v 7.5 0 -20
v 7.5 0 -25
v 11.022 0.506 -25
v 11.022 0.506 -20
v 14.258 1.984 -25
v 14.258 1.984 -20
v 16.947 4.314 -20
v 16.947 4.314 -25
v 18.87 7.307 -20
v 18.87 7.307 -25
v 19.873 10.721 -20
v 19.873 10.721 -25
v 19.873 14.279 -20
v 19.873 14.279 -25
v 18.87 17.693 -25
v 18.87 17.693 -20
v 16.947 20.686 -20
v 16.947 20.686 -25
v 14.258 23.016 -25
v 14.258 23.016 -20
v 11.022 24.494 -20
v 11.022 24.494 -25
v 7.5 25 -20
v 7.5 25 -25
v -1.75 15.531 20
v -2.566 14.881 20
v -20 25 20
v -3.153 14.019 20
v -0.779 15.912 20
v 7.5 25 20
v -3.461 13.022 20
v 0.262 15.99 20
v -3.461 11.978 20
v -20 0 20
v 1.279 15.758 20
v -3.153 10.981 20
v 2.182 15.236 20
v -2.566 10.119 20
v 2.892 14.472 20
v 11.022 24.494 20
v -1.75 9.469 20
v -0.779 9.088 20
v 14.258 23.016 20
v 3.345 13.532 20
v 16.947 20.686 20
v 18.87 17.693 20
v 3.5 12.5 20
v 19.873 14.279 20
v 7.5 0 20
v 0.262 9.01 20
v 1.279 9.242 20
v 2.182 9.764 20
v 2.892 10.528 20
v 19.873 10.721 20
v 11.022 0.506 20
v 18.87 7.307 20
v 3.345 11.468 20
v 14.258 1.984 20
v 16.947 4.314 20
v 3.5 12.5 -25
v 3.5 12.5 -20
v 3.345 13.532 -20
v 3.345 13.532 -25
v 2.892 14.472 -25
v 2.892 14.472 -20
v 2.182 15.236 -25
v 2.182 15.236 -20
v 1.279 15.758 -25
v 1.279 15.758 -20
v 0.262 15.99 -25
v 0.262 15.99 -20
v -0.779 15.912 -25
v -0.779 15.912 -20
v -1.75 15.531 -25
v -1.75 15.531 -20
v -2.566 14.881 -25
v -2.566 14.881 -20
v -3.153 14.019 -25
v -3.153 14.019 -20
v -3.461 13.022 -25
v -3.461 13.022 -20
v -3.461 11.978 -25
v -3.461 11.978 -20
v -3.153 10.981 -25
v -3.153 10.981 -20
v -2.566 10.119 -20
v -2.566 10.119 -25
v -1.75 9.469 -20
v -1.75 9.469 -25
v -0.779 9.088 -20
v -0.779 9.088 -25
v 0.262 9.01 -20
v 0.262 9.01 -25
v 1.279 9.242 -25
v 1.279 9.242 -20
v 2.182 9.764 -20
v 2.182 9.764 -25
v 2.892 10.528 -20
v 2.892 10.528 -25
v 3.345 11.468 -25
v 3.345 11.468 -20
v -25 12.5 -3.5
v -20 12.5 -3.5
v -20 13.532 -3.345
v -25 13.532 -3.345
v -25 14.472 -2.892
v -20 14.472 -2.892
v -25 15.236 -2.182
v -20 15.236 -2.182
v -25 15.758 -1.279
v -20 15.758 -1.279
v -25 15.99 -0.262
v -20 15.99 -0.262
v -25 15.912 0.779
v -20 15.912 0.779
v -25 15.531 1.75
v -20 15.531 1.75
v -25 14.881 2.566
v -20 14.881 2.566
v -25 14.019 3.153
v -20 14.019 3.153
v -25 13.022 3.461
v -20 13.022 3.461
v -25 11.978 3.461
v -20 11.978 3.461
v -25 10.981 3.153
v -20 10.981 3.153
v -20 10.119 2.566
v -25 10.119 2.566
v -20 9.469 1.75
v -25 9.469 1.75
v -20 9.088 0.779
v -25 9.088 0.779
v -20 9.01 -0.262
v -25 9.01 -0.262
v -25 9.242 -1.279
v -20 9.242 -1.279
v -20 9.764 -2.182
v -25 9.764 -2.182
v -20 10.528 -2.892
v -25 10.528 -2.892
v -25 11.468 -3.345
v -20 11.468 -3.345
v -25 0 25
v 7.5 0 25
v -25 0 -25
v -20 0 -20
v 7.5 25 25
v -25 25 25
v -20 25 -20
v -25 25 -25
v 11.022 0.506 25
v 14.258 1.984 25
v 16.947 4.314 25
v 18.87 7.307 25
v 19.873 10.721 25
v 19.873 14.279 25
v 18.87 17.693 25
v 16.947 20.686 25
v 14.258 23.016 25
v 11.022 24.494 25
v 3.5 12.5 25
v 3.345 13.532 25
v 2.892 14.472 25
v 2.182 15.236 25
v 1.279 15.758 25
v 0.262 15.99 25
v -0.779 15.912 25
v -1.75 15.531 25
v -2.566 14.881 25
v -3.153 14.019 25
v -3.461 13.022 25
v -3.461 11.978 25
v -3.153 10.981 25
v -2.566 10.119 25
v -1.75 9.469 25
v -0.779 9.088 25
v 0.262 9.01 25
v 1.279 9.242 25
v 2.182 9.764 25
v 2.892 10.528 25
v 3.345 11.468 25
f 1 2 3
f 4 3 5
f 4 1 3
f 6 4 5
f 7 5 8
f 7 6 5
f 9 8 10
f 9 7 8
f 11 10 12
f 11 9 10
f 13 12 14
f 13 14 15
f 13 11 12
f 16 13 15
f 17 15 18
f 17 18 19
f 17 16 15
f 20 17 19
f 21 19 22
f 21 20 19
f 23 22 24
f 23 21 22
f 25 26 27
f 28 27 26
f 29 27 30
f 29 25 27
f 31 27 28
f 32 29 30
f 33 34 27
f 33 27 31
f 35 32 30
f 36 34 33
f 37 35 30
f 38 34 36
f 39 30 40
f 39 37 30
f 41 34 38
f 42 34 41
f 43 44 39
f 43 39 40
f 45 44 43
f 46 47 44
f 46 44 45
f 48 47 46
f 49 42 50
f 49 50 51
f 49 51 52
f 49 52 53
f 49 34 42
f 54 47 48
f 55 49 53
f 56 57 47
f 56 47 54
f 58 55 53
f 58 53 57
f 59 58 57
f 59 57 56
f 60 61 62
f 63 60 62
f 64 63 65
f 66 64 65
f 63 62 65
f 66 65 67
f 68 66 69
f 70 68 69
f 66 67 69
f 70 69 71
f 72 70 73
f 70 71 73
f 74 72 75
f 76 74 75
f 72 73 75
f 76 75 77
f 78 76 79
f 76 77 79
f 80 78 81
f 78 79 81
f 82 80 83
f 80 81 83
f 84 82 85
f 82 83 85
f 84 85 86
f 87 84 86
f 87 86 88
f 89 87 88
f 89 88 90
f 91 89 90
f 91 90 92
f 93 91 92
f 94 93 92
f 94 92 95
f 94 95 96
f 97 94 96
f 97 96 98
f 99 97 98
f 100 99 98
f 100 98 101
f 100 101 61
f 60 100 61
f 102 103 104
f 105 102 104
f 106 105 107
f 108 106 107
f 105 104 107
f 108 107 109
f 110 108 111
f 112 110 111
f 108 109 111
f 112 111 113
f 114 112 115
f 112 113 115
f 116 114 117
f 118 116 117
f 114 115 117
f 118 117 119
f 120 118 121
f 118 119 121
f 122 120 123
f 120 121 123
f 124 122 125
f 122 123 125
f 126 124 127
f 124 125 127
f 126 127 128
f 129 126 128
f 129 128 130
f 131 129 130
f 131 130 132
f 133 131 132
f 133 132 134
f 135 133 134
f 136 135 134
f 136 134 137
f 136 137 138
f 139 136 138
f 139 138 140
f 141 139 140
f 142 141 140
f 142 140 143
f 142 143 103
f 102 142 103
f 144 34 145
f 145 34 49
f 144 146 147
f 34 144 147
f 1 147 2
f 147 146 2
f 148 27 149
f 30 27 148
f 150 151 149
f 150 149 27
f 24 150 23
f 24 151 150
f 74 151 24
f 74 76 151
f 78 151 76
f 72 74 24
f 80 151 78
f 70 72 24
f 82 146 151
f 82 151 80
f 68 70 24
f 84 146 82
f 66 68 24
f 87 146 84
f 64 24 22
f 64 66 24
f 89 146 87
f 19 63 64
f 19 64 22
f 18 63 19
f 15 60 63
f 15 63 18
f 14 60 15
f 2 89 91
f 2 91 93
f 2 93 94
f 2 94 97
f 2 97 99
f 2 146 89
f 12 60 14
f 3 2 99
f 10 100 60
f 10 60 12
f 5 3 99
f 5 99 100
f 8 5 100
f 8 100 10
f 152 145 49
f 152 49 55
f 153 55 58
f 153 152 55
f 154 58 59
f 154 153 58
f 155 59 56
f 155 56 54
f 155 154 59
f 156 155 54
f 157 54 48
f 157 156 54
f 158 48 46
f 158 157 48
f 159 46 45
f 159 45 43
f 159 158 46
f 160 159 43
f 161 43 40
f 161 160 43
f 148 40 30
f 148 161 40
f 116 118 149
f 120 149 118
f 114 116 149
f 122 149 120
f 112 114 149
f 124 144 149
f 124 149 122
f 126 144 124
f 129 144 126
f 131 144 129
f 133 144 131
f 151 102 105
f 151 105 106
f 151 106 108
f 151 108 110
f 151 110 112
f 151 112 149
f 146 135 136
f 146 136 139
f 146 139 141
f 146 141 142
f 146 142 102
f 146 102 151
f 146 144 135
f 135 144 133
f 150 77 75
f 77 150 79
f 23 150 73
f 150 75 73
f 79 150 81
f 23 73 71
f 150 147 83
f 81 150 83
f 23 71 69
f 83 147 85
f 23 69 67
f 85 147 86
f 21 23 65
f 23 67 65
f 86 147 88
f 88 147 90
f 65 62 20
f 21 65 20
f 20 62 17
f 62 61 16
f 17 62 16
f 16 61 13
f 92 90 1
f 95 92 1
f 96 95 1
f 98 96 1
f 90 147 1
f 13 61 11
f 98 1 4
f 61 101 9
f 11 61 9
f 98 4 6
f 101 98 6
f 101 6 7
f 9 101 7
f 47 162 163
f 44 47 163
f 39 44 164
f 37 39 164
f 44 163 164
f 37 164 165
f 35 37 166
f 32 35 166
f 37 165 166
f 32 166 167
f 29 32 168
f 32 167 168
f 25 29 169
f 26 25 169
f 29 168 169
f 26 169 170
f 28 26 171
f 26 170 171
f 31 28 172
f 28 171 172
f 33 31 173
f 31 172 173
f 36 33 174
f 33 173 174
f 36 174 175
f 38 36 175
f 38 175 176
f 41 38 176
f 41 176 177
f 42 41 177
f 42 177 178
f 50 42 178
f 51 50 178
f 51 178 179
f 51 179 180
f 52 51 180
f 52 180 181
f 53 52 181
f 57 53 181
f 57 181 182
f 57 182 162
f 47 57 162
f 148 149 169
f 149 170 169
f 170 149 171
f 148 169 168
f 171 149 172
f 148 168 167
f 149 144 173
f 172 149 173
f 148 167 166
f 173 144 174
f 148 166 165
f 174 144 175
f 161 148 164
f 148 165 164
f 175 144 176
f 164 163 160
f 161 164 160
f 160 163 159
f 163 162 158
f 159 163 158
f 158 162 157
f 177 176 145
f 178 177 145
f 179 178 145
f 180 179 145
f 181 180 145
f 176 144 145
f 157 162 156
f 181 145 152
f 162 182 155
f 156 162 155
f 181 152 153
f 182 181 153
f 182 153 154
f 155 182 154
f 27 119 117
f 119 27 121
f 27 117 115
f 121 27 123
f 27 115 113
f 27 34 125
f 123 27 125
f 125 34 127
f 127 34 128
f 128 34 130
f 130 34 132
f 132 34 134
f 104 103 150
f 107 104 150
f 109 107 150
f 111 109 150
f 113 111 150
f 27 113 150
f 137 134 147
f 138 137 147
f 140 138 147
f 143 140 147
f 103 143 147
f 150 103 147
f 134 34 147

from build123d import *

# Parameters (mm, degrees)
SKETCH1_W           = 50
SKETCH1_H           = 50
SKETCH1_W_2         = 40
SKETCH1_H_2         = 40
BOSS_EXTRUDE1_DEPTH = 25
SKETCH2_R           = 3.5
CUT_EXTRUDE1_DEPTH  = 55
SKETCH3_R           = 3.5
CUT_EXTRUDE2_DEPTH  = 55
CUT_EXTRUDE3_DEPTH  = 62.23724357


with BuildPart() as part:
    # Sketch1 → Boss-Extrude1 (new body)
    with BuildSketch(Plane(origin=(0, 0, 0), x_dir=(1, 0, 0), z_dir=(0, 1, 0))):
        Rectangle(SKETCH1_W, SKETCH1_H)
        Rectangle(SKETCH1_W_2, SKETCH1_H_2, mode=Mode.SUBTRACT)
    extrude(amount=BOSS_EXTRUDE1_DEPTH)

    # Sketch2 → Cut-Extrude1 (cut)
    with BuildSketch(Plane(origin=(25, 0, 0), x_dir=(0, 0, -1), z_dir=(1, 0, 0))):
        with Locations((0, 12.5)):
            Circle(SKETCH2_R)
    extrude(amount=-CUT_EXTRUDE1_DEPTH, mode=Mode.SUBTRACT)

    # Sketch3 → Cut-Extrude2 (cut)
    with BuildSketch(Plane.XY.offset(25)):
        with Locations((0, 12.5)):
            Circle(SKETCH3_R)
    extrude(amount=-CUT_EXTRUDE2_DEPTH, mode=Mode.SUBTRACT)

    # Sketch4 → Cut-Extrude3 (cut, through all)
    with BuildSketch(Plane.XY.offset(25)):
        with BuildLine():
            Line((7.5, 25), (25, 25))
            Line((25, 25), (25, 0))
            Line((25, 0), (7.5, 0))
            ThreePointArc((7.5, 0), (20, 12.5), (7.5, 25))
        make_face()
    extrude(amount=-CUT_EXTRUDE3_DEPTH, mode=Mode.SUBTRACT)


solid = part.part
